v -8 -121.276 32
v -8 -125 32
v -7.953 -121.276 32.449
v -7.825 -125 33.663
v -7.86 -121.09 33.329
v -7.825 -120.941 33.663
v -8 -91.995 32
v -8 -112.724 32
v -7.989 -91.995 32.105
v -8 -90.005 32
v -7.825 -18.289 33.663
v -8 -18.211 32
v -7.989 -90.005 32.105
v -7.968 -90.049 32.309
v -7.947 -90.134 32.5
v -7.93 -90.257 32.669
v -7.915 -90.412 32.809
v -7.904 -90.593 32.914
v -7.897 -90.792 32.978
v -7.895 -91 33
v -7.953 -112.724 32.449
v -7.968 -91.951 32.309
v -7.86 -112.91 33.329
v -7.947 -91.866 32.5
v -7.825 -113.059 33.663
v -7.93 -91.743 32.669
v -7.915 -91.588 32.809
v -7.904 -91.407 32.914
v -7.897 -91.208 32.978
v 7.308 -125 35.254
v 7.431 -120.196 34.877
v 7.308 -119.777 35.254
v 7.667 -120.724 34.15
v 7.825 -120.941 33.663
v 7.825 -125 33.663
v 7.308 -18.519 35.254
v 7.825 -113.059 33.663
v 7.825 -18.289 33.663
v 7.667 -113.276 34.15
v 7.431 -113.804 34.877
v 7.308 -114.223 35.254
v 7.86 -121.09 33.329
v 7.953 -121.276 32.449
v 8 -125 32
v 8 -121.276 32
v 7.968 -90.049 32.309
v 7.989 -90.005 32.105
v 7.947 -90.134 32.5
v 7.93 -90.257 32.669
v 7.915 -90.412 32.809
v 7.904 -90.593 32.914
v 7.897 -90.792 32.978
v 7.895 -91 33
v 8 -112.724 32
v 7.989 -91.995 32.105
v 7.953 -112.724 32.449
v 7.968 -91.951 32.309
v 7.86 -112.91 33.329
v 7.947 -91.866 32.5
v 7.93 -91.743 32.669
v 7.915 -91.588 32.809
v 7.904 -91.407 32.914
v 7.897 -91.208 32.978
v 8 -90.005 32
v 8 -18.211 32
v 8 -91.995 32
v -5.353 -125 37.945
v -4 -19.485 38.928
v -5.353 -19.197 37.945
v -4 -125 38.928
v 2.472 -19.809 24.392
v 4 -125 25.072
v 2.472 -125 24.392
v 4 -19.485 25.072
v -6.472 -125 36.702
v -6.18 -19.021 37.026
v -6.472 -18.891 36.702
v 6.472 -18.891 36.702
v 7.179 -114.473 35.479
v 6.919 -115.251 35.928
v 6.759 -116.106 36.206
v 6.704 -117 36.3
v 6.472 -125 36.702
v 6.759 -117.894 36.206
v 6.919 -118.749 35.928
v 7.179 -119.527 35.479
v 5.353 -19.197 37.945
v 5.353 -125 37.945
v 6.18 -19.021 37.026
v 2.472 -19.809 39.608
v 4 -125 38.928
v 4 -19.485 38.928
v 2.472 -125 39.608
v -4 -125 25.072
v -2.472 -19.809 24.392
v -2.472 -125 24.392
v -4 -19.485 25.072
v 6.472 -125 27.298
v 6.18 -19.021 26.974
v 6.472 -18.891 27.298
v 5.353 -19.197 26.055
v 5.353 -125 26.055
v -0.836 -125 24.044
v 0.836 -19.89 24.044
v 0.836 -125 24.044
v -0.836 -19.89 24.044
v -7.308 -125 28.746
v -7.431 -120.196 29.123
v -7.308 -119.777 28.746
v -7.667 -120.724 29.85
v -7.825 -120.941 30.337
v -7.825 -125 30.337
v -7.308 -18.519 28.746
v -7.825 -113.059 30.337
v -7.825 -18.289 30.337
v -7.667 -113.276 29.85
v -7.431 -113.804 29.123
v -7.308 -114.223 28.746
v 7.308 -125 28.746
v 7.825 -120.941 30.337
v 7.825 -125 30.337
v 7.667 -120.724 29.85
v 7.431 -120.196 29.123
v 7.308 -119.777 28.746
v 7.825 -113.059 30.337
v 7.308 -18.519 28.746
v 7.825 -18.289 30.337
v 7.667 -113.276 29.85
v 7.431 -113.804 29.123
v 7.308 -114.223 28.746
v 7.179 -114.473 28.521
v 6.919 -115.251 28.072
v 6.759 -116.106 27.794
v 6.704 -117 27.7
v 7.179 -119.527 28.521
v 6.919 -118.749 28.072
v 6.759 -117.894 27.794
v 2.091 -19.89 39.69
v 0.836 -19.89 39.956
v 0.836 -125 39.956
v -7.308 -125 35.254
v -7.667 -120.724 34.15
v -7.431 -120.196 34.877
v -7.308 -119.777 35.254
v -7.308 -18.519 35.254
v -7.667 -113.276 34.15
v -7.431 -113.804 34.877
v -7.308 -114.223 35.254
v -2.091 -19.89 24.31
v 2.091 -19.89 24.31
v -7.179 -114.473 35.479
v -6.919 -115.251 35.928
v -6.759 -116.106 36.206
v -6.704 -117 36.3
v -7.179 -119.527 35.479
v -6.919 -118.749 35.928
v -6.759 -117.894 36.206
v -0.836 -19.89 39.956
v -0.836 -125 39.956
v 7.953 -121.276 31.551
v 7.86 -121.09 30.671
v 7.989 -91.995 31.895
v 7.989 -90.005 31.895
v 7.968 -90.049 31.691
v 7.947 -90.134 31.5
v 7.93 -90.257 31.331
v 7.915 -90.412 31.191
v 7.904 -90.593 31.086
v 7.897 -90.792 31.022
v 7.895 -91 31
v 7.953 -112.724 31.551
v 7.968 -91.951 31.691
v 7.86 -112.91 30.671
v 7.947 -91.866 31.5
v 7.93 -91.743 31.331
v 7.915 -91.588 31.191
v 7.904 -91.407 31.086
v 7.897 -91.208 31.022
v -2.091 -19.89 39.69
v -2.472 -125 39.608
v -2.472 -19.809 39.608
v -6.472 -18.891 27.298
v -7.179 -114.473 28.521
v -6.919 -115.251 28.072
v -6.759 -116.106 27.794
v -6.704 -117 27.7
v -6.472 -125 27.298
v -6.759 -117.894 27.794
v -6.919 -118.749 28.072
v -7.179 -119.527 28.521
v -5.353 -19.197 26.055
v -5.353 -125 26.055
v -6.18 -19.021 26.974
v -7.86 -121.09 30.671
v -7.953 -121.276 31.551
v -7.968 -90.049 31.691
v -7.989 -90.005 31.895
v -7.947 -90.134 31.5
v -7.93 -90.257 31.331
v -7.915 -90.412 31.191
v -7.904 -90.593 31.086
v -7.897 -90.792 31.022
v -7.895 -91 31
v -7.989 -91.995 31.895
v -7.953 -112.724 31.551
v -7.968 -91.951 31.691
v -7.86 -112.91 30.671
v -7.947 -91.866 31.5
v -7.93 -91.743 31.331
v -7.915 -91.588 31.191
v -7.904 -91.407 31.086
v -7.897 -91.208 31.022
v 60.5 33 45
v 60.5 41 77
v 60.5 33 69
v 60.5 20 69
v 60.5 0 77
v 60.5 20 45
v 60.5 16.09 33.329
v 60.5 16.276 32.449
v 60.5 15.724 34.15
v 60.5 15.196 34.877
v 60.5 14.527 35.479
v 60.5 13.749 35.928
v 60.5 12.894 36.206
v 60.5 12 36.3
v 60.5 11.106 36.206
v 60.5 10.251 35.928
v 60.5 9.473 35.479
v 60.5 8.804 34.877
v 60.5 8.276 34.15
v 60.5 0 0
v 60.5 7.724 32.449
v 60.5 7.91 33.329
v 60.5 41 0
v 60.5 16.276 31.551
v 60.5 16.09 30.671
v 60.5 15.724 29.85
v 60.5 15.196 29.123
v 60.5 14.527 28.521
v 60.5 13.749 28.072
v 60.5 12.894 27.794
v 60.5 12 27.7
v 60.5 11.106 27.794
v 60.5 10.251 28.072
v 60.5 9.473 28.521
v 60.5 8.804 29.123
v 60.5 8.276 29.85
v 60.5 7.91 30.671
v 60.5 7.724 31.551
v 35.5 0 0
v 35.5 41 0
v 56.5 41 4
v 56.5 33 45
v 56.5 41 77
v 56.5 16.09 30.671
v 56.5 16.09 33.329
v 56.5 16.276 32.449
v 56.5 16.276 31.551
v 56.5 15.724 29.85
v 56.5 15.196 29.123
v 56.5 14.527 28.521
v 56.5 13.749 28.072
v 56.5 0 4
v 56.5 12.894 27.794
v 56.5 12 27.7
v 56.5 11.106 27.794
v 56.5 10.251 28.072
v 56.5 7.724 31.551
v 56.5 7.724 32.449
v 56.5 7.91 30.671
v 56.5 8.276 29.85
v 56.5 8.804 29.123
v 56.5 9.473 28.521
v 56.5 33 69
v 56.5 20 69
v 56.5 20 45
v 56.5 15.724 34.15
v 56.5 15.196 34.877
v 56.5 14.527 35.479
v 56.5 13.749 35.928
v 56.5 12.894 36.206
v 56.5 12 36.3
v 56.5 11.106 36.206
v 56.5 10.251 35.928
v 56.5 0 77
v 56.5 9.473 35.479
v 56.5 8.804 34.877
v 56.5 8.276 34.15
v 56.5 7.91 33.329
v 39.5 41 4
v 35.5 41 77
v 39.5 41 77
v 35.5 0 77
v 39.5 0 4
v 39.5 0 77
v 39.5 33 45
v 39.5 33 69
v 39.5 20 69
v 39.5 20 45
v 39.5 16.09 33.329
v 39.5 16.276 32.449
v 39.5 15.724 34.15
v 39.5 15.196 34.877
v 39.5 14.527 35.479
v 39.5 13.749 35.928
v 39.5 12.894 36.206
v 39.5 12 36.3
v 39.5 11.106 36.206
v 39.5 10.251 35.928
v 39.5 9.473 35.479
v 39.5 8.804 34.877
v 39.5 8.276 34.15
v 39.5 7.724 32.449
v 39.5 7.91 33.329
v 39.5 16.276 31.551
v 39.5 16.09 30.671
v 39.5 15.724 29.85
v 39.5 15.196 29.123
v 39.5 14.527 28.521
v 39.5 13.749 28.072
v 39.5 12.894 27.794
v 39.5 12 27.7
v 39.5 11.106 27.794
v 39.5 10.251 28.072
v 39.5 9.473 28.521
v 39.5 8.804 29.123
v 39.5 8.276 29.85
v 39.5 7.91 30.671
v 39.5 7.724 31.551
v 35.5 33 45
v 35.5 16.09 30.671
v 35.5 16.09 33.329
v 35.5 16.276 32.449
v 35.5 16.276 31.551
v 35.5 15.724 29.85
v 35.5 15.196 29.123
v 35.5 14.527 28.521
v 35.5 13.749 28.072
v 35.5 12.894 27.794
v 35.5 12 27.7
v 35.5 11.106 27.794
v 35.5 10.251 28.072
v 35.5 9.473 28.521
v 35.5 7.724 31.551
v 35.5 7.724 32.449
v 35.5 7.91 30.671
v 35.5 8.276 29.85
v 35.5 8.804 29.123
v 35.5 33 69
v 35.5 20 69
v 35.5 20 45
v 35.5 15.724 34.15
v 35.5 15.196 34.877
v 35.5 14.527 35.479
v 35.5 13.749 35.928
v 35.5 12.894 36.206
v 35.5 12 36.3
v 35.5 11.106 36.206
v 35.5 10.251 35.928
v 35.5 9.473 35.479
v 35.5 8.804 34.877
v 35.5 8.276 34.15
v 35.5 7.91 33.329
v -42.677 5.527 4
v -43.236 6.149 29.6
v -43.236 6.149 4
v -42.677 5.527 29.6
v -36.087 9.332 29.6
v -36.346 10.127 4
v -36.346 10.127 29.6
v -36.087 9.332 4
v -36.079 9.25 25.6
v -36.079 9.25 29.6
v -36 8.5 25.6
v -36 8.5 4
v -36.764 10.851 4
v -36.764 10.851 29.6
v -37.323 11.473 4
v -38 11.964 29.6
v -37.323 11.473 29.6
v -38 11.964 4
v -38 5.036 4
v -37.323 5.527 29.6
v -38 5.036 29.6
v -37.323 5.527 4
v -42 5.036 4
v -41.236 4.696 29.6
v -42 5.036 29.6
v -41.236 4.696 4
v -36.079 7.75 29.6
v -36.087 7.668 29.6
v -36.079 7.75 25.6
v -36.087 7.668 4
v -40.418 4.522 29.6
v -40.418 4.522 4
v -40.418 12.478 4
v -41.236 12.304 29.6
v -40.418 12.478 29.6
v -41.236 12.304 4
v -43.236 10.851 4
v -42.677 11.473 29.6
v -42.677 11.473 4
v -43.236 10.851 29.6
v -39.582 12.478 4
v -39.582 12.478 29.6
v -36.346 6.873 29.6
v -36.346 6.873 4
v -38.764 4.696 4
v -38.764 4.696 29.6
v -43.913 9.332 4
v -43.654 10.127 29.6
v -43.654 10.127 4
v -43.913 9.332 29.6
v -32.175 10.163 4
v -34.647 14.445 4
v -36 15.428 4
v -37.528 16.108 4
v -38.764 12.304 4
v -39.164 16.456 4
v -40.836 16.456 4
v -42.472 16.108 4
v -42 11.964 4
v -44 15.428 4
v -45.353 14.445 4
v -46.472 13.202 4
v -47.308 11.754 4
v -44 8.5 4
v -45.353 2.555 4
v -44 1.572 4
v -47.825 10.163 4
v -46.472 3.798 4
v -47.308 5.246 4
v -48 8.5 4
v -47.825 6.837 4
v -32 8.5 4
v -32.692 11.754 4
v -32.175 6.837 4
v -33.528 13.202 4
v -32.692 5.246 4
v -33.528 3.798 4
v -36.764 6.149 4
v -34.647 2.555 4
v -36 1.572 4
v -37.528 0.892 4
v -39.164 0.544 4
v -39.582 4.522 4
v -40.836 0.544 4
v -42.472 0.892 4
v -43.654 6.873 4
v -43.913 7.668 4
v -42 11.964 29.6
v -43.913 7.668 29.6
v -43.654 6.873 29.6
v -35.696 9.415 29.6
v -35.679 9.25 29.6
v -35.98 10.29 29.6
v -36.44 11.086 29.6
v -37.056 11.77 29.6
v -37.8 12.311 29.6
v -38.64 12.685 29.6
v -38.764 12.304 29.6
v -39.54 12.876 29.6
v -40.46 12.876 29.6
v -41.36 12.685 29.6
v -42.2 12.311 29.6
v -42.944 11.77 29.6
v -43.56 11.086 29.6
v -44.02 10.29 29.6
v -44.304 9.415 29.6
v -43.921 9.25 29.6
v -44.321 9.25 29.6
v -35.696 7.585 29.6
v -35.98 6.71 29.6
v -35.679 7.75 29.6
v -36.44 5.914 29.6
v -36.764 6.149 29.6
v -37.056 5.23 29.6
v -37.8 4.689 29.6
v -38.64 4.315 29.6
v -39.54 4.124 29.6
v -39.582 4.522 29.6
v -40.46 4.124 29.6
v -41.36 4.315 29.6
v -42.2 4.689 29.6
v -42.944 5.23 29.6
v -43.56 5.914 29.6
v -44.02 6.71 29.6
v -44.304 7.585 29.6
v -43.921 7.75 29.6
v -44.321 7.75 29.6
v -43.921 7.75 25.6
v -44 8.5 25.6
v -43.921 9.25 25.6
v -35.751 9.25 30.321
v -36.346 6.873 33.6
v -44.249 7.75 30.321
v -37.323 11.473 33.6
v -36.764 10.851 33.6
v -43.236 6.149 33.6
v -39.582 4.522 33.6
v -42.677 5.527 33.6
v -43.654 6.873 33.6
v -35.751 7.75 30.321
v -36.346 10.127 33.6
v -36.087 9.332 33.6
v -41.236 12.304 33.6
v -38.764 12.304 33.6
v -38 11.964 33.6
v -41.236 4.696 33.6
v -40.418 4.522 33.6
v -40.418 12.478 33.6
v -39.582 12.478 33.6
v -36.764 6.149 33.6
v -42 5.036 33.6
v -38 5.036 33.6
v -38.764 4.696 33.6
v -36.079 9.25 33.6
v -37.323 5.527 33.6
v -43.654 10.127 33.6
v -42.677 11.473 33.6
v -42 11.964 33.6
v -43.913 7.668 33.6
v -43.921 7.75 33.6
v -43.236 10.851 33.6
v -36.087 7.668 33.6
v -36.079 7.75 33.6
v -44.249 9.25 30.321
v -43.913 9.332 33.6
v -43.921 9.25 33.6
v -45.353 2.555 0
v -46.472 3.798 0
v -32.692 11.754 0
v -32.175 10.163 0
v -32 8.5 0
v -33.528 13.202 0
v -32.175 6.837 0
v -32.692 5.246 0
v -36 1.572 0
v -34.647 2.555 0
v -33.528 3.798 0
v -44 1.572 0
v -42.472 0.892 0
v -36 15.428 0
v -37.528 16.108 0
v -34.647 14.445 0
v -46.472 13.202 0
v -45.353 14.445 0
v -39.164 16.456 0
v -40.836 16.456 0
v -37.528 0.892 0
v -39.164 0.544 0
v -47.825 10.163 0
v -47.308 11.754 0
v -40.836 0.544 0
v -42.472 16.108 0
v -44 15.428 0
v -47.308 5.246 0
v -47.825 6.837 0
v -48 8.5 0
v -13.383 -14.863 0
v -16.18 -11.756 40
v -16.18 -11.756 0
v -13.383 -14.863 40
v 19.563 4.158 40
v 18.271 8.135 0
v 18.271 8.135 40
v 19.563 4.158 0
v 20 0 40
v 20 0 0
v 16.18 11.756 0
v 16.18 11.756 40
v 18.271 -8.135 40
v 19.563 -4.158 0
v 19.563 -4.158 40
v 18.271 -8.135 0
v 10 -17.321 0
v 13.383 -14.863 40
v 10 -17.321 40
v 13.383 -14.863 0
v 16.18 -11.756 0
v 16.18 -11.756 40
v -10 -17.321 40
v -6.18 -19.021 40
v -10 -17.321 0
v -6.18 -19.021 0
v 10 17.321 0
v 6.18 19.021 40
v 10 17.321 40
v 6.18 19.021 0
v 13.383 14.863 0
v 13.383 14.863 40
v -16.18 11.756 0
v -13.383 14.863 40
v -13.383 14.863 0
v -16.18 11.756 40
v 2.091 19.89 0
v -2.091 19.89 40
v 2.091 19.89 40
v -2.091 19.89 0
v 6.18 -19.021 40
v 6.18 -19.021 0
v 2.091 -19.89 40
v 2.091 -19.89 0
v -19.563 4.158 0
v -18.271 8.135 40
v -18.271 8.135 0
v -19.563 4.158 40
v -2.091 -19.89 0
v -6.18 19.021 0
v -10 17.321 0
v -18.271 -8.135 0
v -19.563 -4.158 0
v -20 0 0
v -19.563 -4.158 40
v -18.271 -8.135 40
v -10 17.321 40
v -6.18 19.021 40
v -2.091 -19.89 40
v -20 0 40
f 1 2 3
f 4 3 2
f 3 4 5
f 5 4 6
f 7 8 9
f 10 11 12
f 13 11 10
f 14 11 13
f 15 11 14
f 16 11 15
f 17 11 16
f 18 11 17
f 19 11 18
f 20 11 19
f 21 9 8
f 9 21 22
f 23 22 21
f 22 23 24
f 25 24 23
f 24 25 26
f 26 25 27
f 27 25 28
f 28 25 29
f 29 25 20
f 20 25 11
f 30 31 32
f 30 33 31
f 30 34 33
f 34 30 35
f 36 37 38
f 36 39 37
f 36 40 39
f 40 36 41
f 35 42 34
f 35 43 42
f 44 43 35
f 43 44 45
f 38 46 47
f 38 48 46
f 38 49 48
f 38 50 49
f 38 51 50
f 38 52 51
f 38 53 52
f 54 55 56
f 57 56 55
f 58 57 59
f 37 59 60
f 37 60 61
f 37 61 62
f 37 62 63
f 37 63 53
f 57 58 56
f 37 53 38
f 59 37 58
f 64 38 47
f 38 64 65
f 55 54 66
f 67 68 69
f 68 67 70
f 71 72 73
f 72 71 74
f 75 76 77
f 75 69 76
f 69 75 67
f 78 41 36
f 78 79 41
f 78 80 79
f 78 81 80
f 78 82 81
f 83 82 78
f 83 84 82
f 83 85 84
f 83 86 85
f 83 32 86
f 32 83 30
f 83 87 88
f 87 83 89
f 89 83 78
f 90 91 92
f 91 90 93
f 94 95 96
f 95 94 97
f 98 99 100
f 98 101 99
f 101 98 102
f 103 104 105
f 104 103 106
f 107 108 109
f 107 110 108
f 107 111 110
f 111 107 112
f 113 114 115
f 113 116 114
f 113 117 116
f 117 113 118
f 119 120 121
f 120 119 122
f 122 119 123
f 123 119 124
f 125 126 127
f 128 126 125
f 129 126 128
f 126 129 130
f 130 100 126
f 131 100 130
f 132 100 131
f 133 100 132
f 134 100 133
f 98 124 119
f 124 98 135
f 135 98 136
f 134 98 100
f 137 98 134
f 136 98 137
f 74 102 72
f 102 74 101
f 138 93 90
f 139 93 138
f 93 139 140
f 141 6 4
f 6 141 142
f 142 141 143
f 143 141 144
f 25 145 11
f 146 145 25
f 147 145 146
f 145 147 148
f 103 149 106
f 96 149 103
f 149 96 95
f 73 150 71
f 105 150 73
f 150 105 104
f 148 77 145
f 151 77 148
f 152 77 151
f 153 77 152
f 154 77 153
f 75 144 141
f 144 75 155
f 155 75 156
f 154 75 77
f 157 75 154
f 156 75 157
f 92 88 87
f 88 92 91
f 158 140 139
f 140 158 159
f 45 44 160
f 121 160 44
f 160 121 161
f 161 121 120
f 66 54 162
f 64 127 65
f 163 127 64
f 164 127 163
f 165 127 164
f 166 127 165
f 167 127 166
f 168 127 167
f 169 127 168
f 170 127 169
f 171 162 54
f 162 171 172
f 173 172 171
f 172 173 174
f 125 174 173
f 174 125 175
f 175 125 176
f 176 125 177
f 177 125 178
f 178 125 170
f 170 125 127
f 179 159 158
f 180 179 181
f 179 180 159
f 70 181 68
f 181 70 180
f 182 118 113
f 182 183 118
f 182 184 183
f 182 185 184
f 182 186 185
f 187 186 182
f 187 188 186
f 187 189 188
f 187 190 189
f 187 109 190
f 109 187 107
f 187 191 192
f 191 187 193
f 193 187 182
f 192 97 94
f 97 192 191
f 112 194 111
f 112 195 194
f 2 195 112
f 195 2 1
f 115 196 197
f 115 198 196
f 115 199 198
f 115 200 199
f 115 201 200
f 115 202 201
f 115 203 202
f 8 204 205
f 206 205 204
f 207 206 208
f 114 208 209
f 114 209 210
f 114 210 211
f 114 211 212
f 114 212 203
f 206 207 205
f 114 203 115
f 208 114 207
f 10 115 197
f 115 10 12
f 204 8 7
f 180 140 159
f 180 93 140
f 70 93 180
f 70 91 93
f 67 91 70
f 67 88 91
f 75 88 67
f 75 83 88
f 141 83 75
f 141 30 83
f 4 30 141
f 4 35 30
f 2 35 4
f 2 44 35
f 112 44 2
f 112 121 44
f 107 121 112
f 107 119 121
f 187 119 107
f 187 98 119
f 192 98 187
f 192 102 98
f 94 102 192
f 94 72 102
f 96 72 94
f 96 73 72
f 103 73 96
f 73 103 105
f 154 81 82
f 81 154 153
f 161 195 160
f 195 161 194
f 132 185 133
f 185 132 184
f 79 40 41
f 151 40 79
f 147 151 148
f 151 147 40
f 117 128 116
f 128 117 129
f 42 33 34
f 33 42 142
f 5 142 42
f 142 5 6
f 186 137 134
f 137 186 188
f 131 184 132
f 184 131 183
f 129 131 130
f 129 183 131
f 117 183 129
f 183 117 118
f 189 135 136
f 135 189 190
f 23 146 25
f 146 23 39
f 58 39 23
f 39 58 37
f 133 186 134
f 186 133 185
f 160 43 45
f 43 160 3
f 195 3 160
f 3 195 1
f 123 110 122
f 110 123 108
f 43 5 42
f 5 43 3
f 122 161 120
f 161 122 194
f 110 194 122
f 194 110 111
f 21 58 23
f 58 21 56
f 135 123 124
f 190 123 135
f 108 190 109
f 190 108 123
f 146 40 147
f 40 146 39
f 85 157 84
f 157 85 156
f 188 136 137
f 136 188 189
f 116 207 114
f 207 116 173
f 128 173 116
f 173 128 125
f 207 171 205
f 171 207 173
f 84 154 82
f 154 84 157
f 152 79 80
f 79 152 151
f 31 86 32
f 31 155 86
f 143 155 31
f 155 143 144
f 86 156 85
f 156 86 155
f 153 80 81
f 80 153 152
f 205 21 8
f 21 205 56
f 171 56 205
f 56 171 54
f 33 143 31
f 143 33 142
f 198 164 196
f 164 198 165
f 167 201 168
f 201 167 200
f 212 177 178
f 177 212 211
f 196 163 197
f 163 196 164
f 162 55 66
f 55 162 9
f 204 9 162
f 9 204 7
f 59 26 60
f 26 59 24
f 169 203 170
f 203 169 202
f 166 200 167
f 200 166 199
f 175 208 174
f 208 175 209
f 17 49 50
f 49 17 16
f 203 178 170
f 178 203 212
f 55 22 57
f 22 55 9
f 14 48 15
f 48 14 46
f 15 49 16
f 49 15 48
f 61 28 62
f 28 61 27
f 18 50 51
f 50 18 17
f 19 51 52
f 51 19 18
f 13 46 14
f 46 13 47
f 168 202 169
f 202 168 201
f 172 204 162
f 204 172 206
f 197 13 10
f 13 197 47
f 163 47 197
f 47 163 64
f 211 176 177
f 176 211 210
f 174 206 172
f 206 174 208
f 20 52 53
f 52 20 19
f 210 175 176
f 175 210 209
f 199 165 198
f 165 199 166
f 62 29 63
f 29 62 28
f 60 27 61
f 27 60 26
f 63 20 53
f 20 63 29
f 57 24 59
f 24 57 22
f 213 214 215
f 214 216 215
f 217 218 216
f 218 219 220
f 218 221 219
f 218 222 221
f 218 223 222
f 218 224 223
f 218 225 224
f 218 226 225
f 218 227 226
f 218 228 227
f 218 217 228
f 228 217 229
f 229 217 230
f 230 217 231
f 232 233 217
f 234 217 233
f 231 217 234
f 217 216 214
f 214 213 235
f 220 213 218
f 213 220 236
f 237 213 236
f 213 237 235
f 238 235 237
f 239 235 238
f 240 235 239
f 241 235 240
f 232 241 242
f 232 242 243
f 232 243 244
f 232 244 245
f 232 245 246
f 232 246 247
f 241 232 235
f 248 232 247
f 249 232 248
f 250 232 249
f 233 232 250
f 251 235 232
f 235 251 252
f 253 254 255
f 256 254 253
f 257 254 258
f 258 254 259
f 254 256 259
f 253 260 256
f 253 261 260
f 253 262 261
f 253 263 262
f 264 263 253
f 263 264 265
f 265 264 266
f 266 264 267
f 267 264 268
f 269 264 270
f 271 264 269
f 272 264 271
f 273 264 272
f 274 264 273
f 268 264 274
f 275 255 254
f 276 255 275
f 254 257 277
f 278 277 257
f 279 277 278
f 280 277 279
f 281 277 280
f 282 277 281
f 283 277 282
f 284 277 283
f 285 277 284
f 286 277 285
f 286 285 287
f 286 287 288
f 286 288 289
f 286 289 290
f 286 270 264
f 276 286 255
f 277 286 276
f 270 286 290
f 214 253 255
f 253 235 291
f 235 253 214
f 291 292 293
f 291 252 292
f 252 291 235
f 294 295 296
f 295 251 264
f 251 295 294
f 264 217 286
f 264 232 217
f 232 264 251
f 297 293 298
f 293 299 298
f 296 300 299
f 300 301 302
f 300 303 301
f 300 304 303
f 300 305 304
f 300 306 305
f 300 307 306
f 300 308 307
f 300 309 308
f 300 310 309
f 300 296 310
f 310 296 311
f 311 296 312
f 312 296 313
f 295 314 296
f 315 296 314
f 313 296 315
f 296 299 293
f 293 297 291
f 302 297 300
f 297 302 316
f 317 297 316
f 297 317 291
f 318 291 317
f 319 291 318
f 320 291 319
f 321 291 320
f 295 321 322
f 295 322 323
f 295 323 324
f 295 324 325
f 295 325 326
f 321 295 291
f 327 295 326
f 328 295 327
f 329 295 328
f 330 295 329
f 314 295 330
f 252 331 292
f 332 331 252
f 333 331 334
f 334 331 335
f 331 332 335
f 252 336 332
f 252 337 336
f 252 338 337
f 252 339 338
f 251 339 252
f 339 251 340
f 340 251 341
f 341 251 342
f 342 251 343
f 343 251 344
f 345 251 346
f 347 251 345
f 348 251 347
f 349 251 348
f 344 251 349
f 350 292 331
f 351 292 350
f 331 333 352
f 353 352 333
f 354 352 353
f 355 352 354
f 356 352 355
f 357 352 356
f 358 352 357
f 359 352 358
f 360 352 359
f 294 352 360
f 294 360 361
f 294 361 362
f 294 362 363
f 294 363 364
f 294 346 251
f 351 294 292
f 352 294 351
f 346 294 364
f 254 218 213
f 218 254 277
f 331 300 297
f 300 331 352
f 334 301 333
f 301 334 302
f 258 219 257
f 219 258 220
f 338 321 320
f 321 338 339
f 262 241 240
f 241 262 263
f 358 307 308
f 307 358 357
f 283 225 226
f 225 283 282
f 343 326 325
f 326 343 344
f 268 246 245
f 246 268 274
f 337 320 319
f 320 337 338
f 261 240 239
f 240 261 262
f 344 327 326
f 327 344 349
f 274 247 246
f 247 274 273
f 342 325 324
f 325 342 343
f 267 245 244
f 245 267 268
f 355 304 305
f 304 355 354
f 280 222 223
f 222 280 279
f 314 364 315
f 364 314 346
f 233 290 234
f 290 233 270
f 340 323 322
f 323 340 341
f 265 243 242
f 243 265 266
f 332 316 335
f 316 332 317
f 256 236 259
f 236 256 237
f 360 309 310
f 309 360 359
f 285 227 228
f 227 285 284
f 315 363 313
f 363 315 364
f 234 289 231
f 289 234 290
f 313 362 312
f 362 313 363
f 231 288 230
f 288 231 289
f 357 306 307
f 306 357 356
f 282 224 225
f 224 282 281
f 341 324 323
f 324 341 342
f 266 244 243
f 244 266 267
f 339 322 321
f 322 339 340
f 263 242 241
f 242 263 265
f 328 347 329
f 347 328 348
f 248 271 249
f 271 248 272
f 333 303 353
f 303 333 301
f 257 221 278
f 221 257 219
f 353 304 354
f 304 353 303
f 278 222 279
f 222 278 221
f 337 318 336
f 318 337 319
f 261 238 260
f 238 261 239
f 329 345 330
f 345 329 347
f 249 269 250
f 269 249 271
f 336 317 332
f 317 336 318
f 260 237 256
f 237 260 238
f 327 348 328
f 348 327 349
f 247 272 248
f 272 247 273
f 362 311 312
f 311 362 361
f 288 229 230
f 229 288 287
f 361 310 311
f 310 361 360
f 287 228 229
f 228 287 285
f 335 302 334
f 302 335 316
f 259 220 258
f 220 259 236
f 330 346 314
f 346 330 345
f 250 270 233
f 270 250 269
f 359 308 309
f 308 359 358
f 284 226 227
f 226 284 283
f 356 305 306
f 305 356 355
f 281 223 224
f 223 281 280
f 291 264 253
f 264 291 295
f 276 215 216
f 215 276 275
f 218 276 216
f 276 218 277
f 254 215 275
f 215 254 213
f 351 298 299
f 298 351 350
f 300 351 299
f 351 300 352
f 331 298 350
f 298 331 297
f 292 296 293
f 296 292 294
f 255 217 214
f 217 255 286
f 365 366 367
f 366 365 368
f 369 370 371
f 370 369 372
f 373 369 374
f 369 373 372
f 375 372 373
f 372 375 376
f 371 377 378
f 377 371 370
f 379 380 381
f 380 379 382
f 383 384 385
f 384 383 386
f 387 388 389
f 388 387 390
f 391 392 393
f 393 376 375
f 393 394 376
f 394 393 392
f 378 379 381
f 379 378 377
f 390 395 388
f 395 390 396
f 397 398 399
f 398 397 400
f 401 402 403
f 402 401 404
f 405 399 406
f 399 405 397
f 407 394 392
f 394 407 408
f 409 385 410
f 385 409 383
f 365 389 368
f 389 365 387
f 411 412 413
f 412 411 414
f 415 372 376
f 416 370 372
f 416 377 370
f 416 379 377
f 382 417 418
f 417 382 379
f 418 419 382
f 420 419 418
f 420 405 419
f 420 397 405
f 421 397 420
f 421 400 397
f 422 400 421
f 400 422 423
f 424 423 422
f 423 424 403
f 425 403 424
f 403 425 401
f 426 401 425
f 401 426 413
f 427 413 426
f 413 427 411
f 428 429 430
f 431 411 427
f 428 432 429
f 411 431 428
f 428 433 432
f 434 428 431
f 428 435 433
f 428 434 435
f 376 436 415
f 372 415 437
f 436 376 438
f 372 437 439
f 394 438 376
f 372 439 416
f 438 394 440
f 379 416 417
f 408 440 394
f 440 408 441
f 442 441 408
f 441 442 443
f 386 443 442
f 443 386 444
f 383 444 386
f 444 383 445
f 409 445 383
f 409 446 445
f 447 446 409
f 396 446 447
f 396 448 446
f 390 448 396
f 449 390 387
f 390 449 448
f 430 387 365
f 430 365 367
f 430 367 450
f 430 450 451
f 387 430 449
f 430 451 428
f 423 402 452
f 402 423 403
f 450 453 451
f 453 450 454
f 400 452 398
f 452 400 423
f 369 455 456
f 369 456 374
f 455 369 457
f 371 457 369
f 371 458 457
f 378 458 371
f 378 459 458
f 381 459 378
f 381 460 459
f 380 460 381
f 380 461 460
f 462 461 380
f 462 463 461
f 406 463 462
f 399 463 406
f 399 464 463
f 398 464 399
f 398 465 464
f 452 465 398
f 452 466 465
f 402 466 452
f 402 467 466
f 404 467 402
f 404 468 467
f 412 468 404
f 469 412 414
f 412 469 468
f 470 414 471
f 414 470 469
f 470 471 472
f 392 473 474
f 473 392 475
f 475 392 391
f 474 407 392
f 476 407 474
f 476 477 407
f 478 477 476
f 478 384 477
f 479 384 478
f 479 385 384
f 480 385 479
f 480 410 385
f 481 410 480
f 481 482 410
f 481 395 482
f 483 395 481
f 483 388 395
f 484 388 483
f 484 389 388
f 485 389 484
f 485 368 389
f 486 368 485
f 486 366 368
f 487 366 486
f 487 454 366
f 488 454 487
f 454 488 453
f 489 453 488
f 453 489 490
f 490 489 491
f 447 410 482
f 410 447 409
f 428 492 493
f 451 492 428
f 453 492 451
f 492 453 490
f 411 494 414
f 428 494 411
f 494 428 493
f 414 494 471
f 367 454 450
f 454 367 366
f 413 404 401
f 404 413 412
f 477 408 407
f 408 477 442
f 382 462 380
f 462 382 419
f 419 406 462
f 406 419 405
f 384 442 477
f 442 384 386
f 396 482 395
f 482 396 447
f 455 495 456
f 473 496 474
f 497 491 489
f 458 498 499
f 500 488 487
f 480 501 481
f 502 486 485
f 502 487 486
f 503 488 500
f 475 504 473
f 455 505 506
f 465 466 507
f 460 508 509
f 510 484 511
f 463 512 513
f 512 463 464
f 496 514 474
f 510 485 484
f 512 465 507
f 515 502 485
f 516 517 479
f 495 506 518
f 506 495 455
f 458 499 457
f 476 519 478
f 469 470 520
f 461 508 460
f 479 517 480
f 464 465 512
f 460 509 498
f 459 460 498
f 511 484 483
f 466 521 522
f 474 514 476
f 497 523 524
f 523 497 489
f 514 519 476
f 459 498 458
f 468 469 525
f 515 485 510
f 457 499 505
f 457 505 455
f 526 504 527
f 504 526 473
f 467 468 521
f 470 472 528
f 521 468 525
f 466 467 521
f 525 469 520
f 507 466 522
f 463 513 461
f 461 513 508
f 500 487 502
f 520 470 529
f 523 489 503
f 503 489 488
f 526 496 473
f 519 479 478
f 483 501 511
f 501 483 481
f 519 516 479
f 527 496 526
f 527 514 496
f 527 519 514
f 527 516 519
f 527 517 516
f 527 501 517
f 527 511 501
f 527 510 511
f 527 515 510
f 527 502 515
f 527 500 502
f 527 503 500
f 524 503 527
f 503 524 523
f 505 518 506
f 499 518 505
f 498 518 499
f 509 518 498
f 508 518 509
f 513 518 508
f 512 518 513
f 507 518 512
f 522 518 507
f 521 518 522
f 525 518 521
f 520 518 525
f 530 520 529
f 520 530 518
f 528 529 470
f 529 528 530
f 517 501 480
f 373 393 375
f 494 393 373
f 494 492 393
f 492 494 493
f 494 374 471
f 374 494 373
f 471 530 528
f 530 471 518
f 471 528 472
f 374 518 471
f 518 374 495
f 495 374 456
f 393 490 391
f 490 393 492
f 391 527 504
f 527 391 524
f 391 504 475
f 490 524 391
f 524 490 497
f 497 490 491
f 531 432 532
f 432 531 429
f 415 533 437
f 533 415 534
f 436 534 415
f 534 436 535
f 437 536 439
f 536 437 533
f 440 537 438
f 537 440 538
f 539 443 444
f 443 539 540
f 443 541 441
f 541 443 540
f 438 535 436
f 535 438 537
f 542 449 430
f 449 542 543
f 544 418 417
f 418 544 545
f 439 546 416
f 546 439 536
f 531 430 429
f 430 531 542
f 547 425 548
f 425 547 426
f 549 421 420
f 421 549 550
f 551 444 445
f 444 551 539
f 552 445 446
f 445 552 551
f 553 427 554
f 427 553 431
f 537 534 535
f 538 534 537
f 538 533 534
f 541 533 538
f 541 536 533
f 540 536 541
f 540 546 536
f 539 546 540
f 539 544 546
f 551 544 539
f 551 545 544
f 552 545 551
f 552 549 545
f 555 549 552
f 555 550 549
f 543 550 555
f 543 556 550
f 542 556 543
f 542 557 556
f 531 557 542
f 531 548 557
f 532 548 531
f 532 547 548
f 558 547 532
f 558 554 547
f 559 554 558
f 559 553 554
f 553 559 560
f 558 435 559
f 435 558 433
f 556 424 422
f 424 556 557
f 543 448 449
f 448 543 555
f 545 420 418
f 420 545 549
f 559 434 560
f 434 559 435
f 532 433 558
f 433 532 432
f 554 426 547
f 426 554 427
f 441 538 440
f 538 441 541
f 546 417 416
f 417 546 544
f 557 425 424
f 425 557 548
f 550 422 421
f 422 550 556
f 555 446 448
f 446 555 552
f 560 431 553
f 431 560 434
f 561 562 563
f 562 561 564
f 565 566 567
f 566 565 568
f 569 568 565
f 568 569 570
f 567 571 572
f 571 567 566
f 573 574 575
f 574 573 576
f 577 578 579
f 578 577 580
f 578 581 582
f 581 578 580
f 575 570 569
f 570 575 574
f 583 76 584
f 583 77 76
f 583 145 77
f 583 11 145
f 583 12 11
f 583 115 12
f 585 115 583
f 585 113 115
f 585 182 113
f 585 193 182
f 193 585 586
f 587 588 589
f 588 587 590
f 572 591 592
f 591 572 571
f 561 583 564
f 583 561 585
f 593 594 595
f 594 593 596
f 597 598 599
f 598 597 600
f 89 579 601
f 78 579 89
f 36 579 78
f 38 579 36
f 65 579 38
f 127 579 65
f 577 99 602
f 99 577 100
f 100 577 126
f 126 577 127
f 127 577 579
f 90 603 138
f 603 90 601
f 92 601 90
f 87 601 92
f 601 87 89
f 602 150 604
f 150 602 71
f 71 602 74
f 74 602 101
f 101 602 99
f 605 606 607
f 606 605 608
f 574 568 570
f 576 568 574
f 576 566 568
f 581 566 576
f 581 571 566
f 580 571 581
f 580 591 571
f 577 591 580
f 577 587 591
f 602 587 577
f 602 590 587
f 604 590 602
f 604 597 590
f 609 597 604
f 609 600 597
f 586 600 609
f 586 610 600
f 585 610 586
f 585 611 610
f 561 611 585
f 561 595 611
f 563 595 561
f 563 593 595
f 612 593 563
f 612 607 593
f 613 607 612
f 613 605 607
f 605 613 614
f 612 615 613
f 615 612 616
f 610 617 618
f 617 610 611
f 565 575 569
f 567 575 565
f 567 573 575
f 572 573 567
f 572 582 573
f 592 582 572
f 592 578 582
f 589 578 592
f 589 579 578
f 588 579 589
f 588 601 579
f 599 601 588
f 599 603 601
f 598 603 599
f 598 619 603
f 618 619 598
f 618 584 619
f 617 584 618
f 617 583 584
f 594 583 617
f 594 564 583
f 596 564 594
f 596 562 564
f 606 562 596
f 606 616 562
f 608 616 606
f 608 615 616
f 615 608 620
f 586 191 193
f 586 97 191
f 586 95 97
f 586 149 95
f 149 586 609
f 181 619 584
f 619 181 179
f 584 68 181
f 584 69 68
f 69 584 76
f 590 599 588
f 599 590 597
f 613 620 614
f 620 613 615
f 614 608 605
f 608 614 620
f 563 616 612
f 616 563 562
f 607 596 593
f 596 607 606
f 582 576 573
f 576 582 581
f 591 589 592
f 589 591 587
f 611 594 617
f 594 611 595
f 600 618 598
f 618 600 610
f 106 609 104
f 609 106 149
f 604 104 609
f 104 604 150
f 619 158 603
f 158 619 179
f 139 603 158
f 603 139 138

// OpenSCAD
$fn=30;
handle_r = 8;
handle_l = 125;
head_r = 20;
head_l = 40;
pin_r = 4;
pin_rtol = 0.3;   // gap between pin and the hole
pin_ltol = 0.3;  // gap betwen the pin ends and the hinge
pin_head_r = pin_r * 2;
pin_head_l = 4;
hinge_t = 4;
hinge_tol = 0.5; // gap between the hinge and the handle
hinge_pin_y = pin_r*3;
servo_arm_l = 13;
drive_hole_r = 1;
barb_l = 4;
barb_r = 0.1;
slot_t = 1.5;
slot_l = barb_l + 4;



explode = 1;  //  set to 1 to print, 0 to see assembly

diff_tol = 1; // tolerance for diff operations

pin_l = handle_r*2 + hinge_tol*2 + hinge_t * 2 + pin_ltol*2;  // just the shaft part
pin_offset = pin_r * 2;
handle_z = head_l-handle_r;
pin_y = -handle_l + pin_offset;

servo_l = 24;
servo_w = 13;
servo_z = handle_z + handle_r + 5;
servo_y = hinge_pin_y + handle_r;
servo_oh = 8;

/***** hammer *****/
// head
cylinder( r = head_r, h = head_l);
// handle
difference() {
    // handle itself
    translate( [0, 0, handle_z ] )                             rotate( [90,0,0])  cylinder( r = handle_r, h = handle_l);
    // hold for pin
    translate( [-pin_l/2, pin_y, handle_z] )                   rotate( [0,90,0] ) cylinder( r=pin_r+pin_rtol, h=pin_l);
    // drive hole
    translate( [-pin_l/2, pin_y + servo_arm_l * 2, handle_z] ) rotate( [0,90,0] ) cylinder( r=drive_hole_r, h=pin_l);
    
}

/**** hinge ****/
hinge_w = handle_r*2 + hinge_tol * 2;  // inner
hinge_l = servo_y+servo_w+servo_oh;
hinge_y = pin_y - hinge_w /2 ;
color("blue") translate( [explode*head_r*3 - hinge_l/2, (1-explode) * hinge_y,0 ] ) {
    
    // base
                                                                             cube([hinge_w,hinge_l,hinge_t]);
    difference() {
        union() {
            translate( [hinge_w, 0,0])                                       cube( [hinge_t, hinge_l, handle_z] );
            translate( [-hinge_t, 0,0])                                      cube( [hinge_t, hinge_l, handle_z] );
            // sides
//            translate( [hinge_w, hinge_w/2, handle_z] )  rotate( [0,90,0])   cylinder( r=hinge_w/2, h=hinge_t);
//            translate( [-hinge_t, hinge_w/2, handle_z] ) rotate( [0,90,0])   cylinder( r=hinge_w/2, h=hinge_t);
            translate( [hinge_w, 0, handle_z] )                      cube( [hinge_t, hinge_l, servo_z - handle_z]);
            translate( [-hinge_t, 0, handle_z] )                     cube( [hinge_t, hinge_l, servo_z - handle_z]);
        }
        // hole for pin
        translate( [-hinge_t, hinge_pin_y, handle_z] )     rotate( [0,90,0])   cylinder( r=pin_r + pin_rtol, h=pin_l);
        
    }
    // servo_holder
    translate( [hinge_w,0,servo_z])                                             cube( [hinge_t, servo_y, servo_l] ) ;
    translate( [hinge_w,servo_y+servo_w,servo_z])                               cube( [hinge_t, servo_oh, servo_l] ) ;
    translate( [-hinge_t,0,servo_z])                                            cube( [hinge_t, servo_y, servo_l] ) ;
    translate( [-hinge_t,servo_y+servo_w,servo_z])                              cube( [hinge_t, servo_oh, servo_l] ) ;
    translate( [-hinge_t,0, servo_z + servo_l])                                 cube( [hinge_t, servo_y + servo_w + servo_oh, servo_oh] ) ;
    translate( [ hinge_w,0, servo_z + servo_l])                                 cube( [hinge_t, servo_y + servo_w + servo_oh, servo_oh] ) ;
   
}


/**** pin ****/
translate( [ -explode*head_r*2 + (1-explode) * -(pin_l/2 + pin_head_l ), (1-explode) * hinge_y + hinge_w/2, (1-explode)*handle_z] ) rotate( [0, 90*(1-explode), 0] )  {
    // pin head
    cylinder( r=pin_head_r, h=pin_head_l) sphere( r=0.5);
    difference() {
        union() {
            // pin shaft
            translate( [ 0,0, pin_head_l] ) cylinder( r=pin_r, h=pin_l) sphere( 0.5);
            // pin barb
            translate( [0,0,pin_head_l + pin_l] ) cylinder( r1=pin_r+barb_r+pin_rtol, r2=pin_r,h=barb_l );
        }
        // slot
        translate( [-pin_r-barb_r-pin_rtol,-slot_t/2, pin_l+pin_head_l+barb_l-slot_l]) color("red") cube( [pin_r*2+barb_r*2+pin_rtol*2, slot_t, slot_l] ) ;
    }
    
}
